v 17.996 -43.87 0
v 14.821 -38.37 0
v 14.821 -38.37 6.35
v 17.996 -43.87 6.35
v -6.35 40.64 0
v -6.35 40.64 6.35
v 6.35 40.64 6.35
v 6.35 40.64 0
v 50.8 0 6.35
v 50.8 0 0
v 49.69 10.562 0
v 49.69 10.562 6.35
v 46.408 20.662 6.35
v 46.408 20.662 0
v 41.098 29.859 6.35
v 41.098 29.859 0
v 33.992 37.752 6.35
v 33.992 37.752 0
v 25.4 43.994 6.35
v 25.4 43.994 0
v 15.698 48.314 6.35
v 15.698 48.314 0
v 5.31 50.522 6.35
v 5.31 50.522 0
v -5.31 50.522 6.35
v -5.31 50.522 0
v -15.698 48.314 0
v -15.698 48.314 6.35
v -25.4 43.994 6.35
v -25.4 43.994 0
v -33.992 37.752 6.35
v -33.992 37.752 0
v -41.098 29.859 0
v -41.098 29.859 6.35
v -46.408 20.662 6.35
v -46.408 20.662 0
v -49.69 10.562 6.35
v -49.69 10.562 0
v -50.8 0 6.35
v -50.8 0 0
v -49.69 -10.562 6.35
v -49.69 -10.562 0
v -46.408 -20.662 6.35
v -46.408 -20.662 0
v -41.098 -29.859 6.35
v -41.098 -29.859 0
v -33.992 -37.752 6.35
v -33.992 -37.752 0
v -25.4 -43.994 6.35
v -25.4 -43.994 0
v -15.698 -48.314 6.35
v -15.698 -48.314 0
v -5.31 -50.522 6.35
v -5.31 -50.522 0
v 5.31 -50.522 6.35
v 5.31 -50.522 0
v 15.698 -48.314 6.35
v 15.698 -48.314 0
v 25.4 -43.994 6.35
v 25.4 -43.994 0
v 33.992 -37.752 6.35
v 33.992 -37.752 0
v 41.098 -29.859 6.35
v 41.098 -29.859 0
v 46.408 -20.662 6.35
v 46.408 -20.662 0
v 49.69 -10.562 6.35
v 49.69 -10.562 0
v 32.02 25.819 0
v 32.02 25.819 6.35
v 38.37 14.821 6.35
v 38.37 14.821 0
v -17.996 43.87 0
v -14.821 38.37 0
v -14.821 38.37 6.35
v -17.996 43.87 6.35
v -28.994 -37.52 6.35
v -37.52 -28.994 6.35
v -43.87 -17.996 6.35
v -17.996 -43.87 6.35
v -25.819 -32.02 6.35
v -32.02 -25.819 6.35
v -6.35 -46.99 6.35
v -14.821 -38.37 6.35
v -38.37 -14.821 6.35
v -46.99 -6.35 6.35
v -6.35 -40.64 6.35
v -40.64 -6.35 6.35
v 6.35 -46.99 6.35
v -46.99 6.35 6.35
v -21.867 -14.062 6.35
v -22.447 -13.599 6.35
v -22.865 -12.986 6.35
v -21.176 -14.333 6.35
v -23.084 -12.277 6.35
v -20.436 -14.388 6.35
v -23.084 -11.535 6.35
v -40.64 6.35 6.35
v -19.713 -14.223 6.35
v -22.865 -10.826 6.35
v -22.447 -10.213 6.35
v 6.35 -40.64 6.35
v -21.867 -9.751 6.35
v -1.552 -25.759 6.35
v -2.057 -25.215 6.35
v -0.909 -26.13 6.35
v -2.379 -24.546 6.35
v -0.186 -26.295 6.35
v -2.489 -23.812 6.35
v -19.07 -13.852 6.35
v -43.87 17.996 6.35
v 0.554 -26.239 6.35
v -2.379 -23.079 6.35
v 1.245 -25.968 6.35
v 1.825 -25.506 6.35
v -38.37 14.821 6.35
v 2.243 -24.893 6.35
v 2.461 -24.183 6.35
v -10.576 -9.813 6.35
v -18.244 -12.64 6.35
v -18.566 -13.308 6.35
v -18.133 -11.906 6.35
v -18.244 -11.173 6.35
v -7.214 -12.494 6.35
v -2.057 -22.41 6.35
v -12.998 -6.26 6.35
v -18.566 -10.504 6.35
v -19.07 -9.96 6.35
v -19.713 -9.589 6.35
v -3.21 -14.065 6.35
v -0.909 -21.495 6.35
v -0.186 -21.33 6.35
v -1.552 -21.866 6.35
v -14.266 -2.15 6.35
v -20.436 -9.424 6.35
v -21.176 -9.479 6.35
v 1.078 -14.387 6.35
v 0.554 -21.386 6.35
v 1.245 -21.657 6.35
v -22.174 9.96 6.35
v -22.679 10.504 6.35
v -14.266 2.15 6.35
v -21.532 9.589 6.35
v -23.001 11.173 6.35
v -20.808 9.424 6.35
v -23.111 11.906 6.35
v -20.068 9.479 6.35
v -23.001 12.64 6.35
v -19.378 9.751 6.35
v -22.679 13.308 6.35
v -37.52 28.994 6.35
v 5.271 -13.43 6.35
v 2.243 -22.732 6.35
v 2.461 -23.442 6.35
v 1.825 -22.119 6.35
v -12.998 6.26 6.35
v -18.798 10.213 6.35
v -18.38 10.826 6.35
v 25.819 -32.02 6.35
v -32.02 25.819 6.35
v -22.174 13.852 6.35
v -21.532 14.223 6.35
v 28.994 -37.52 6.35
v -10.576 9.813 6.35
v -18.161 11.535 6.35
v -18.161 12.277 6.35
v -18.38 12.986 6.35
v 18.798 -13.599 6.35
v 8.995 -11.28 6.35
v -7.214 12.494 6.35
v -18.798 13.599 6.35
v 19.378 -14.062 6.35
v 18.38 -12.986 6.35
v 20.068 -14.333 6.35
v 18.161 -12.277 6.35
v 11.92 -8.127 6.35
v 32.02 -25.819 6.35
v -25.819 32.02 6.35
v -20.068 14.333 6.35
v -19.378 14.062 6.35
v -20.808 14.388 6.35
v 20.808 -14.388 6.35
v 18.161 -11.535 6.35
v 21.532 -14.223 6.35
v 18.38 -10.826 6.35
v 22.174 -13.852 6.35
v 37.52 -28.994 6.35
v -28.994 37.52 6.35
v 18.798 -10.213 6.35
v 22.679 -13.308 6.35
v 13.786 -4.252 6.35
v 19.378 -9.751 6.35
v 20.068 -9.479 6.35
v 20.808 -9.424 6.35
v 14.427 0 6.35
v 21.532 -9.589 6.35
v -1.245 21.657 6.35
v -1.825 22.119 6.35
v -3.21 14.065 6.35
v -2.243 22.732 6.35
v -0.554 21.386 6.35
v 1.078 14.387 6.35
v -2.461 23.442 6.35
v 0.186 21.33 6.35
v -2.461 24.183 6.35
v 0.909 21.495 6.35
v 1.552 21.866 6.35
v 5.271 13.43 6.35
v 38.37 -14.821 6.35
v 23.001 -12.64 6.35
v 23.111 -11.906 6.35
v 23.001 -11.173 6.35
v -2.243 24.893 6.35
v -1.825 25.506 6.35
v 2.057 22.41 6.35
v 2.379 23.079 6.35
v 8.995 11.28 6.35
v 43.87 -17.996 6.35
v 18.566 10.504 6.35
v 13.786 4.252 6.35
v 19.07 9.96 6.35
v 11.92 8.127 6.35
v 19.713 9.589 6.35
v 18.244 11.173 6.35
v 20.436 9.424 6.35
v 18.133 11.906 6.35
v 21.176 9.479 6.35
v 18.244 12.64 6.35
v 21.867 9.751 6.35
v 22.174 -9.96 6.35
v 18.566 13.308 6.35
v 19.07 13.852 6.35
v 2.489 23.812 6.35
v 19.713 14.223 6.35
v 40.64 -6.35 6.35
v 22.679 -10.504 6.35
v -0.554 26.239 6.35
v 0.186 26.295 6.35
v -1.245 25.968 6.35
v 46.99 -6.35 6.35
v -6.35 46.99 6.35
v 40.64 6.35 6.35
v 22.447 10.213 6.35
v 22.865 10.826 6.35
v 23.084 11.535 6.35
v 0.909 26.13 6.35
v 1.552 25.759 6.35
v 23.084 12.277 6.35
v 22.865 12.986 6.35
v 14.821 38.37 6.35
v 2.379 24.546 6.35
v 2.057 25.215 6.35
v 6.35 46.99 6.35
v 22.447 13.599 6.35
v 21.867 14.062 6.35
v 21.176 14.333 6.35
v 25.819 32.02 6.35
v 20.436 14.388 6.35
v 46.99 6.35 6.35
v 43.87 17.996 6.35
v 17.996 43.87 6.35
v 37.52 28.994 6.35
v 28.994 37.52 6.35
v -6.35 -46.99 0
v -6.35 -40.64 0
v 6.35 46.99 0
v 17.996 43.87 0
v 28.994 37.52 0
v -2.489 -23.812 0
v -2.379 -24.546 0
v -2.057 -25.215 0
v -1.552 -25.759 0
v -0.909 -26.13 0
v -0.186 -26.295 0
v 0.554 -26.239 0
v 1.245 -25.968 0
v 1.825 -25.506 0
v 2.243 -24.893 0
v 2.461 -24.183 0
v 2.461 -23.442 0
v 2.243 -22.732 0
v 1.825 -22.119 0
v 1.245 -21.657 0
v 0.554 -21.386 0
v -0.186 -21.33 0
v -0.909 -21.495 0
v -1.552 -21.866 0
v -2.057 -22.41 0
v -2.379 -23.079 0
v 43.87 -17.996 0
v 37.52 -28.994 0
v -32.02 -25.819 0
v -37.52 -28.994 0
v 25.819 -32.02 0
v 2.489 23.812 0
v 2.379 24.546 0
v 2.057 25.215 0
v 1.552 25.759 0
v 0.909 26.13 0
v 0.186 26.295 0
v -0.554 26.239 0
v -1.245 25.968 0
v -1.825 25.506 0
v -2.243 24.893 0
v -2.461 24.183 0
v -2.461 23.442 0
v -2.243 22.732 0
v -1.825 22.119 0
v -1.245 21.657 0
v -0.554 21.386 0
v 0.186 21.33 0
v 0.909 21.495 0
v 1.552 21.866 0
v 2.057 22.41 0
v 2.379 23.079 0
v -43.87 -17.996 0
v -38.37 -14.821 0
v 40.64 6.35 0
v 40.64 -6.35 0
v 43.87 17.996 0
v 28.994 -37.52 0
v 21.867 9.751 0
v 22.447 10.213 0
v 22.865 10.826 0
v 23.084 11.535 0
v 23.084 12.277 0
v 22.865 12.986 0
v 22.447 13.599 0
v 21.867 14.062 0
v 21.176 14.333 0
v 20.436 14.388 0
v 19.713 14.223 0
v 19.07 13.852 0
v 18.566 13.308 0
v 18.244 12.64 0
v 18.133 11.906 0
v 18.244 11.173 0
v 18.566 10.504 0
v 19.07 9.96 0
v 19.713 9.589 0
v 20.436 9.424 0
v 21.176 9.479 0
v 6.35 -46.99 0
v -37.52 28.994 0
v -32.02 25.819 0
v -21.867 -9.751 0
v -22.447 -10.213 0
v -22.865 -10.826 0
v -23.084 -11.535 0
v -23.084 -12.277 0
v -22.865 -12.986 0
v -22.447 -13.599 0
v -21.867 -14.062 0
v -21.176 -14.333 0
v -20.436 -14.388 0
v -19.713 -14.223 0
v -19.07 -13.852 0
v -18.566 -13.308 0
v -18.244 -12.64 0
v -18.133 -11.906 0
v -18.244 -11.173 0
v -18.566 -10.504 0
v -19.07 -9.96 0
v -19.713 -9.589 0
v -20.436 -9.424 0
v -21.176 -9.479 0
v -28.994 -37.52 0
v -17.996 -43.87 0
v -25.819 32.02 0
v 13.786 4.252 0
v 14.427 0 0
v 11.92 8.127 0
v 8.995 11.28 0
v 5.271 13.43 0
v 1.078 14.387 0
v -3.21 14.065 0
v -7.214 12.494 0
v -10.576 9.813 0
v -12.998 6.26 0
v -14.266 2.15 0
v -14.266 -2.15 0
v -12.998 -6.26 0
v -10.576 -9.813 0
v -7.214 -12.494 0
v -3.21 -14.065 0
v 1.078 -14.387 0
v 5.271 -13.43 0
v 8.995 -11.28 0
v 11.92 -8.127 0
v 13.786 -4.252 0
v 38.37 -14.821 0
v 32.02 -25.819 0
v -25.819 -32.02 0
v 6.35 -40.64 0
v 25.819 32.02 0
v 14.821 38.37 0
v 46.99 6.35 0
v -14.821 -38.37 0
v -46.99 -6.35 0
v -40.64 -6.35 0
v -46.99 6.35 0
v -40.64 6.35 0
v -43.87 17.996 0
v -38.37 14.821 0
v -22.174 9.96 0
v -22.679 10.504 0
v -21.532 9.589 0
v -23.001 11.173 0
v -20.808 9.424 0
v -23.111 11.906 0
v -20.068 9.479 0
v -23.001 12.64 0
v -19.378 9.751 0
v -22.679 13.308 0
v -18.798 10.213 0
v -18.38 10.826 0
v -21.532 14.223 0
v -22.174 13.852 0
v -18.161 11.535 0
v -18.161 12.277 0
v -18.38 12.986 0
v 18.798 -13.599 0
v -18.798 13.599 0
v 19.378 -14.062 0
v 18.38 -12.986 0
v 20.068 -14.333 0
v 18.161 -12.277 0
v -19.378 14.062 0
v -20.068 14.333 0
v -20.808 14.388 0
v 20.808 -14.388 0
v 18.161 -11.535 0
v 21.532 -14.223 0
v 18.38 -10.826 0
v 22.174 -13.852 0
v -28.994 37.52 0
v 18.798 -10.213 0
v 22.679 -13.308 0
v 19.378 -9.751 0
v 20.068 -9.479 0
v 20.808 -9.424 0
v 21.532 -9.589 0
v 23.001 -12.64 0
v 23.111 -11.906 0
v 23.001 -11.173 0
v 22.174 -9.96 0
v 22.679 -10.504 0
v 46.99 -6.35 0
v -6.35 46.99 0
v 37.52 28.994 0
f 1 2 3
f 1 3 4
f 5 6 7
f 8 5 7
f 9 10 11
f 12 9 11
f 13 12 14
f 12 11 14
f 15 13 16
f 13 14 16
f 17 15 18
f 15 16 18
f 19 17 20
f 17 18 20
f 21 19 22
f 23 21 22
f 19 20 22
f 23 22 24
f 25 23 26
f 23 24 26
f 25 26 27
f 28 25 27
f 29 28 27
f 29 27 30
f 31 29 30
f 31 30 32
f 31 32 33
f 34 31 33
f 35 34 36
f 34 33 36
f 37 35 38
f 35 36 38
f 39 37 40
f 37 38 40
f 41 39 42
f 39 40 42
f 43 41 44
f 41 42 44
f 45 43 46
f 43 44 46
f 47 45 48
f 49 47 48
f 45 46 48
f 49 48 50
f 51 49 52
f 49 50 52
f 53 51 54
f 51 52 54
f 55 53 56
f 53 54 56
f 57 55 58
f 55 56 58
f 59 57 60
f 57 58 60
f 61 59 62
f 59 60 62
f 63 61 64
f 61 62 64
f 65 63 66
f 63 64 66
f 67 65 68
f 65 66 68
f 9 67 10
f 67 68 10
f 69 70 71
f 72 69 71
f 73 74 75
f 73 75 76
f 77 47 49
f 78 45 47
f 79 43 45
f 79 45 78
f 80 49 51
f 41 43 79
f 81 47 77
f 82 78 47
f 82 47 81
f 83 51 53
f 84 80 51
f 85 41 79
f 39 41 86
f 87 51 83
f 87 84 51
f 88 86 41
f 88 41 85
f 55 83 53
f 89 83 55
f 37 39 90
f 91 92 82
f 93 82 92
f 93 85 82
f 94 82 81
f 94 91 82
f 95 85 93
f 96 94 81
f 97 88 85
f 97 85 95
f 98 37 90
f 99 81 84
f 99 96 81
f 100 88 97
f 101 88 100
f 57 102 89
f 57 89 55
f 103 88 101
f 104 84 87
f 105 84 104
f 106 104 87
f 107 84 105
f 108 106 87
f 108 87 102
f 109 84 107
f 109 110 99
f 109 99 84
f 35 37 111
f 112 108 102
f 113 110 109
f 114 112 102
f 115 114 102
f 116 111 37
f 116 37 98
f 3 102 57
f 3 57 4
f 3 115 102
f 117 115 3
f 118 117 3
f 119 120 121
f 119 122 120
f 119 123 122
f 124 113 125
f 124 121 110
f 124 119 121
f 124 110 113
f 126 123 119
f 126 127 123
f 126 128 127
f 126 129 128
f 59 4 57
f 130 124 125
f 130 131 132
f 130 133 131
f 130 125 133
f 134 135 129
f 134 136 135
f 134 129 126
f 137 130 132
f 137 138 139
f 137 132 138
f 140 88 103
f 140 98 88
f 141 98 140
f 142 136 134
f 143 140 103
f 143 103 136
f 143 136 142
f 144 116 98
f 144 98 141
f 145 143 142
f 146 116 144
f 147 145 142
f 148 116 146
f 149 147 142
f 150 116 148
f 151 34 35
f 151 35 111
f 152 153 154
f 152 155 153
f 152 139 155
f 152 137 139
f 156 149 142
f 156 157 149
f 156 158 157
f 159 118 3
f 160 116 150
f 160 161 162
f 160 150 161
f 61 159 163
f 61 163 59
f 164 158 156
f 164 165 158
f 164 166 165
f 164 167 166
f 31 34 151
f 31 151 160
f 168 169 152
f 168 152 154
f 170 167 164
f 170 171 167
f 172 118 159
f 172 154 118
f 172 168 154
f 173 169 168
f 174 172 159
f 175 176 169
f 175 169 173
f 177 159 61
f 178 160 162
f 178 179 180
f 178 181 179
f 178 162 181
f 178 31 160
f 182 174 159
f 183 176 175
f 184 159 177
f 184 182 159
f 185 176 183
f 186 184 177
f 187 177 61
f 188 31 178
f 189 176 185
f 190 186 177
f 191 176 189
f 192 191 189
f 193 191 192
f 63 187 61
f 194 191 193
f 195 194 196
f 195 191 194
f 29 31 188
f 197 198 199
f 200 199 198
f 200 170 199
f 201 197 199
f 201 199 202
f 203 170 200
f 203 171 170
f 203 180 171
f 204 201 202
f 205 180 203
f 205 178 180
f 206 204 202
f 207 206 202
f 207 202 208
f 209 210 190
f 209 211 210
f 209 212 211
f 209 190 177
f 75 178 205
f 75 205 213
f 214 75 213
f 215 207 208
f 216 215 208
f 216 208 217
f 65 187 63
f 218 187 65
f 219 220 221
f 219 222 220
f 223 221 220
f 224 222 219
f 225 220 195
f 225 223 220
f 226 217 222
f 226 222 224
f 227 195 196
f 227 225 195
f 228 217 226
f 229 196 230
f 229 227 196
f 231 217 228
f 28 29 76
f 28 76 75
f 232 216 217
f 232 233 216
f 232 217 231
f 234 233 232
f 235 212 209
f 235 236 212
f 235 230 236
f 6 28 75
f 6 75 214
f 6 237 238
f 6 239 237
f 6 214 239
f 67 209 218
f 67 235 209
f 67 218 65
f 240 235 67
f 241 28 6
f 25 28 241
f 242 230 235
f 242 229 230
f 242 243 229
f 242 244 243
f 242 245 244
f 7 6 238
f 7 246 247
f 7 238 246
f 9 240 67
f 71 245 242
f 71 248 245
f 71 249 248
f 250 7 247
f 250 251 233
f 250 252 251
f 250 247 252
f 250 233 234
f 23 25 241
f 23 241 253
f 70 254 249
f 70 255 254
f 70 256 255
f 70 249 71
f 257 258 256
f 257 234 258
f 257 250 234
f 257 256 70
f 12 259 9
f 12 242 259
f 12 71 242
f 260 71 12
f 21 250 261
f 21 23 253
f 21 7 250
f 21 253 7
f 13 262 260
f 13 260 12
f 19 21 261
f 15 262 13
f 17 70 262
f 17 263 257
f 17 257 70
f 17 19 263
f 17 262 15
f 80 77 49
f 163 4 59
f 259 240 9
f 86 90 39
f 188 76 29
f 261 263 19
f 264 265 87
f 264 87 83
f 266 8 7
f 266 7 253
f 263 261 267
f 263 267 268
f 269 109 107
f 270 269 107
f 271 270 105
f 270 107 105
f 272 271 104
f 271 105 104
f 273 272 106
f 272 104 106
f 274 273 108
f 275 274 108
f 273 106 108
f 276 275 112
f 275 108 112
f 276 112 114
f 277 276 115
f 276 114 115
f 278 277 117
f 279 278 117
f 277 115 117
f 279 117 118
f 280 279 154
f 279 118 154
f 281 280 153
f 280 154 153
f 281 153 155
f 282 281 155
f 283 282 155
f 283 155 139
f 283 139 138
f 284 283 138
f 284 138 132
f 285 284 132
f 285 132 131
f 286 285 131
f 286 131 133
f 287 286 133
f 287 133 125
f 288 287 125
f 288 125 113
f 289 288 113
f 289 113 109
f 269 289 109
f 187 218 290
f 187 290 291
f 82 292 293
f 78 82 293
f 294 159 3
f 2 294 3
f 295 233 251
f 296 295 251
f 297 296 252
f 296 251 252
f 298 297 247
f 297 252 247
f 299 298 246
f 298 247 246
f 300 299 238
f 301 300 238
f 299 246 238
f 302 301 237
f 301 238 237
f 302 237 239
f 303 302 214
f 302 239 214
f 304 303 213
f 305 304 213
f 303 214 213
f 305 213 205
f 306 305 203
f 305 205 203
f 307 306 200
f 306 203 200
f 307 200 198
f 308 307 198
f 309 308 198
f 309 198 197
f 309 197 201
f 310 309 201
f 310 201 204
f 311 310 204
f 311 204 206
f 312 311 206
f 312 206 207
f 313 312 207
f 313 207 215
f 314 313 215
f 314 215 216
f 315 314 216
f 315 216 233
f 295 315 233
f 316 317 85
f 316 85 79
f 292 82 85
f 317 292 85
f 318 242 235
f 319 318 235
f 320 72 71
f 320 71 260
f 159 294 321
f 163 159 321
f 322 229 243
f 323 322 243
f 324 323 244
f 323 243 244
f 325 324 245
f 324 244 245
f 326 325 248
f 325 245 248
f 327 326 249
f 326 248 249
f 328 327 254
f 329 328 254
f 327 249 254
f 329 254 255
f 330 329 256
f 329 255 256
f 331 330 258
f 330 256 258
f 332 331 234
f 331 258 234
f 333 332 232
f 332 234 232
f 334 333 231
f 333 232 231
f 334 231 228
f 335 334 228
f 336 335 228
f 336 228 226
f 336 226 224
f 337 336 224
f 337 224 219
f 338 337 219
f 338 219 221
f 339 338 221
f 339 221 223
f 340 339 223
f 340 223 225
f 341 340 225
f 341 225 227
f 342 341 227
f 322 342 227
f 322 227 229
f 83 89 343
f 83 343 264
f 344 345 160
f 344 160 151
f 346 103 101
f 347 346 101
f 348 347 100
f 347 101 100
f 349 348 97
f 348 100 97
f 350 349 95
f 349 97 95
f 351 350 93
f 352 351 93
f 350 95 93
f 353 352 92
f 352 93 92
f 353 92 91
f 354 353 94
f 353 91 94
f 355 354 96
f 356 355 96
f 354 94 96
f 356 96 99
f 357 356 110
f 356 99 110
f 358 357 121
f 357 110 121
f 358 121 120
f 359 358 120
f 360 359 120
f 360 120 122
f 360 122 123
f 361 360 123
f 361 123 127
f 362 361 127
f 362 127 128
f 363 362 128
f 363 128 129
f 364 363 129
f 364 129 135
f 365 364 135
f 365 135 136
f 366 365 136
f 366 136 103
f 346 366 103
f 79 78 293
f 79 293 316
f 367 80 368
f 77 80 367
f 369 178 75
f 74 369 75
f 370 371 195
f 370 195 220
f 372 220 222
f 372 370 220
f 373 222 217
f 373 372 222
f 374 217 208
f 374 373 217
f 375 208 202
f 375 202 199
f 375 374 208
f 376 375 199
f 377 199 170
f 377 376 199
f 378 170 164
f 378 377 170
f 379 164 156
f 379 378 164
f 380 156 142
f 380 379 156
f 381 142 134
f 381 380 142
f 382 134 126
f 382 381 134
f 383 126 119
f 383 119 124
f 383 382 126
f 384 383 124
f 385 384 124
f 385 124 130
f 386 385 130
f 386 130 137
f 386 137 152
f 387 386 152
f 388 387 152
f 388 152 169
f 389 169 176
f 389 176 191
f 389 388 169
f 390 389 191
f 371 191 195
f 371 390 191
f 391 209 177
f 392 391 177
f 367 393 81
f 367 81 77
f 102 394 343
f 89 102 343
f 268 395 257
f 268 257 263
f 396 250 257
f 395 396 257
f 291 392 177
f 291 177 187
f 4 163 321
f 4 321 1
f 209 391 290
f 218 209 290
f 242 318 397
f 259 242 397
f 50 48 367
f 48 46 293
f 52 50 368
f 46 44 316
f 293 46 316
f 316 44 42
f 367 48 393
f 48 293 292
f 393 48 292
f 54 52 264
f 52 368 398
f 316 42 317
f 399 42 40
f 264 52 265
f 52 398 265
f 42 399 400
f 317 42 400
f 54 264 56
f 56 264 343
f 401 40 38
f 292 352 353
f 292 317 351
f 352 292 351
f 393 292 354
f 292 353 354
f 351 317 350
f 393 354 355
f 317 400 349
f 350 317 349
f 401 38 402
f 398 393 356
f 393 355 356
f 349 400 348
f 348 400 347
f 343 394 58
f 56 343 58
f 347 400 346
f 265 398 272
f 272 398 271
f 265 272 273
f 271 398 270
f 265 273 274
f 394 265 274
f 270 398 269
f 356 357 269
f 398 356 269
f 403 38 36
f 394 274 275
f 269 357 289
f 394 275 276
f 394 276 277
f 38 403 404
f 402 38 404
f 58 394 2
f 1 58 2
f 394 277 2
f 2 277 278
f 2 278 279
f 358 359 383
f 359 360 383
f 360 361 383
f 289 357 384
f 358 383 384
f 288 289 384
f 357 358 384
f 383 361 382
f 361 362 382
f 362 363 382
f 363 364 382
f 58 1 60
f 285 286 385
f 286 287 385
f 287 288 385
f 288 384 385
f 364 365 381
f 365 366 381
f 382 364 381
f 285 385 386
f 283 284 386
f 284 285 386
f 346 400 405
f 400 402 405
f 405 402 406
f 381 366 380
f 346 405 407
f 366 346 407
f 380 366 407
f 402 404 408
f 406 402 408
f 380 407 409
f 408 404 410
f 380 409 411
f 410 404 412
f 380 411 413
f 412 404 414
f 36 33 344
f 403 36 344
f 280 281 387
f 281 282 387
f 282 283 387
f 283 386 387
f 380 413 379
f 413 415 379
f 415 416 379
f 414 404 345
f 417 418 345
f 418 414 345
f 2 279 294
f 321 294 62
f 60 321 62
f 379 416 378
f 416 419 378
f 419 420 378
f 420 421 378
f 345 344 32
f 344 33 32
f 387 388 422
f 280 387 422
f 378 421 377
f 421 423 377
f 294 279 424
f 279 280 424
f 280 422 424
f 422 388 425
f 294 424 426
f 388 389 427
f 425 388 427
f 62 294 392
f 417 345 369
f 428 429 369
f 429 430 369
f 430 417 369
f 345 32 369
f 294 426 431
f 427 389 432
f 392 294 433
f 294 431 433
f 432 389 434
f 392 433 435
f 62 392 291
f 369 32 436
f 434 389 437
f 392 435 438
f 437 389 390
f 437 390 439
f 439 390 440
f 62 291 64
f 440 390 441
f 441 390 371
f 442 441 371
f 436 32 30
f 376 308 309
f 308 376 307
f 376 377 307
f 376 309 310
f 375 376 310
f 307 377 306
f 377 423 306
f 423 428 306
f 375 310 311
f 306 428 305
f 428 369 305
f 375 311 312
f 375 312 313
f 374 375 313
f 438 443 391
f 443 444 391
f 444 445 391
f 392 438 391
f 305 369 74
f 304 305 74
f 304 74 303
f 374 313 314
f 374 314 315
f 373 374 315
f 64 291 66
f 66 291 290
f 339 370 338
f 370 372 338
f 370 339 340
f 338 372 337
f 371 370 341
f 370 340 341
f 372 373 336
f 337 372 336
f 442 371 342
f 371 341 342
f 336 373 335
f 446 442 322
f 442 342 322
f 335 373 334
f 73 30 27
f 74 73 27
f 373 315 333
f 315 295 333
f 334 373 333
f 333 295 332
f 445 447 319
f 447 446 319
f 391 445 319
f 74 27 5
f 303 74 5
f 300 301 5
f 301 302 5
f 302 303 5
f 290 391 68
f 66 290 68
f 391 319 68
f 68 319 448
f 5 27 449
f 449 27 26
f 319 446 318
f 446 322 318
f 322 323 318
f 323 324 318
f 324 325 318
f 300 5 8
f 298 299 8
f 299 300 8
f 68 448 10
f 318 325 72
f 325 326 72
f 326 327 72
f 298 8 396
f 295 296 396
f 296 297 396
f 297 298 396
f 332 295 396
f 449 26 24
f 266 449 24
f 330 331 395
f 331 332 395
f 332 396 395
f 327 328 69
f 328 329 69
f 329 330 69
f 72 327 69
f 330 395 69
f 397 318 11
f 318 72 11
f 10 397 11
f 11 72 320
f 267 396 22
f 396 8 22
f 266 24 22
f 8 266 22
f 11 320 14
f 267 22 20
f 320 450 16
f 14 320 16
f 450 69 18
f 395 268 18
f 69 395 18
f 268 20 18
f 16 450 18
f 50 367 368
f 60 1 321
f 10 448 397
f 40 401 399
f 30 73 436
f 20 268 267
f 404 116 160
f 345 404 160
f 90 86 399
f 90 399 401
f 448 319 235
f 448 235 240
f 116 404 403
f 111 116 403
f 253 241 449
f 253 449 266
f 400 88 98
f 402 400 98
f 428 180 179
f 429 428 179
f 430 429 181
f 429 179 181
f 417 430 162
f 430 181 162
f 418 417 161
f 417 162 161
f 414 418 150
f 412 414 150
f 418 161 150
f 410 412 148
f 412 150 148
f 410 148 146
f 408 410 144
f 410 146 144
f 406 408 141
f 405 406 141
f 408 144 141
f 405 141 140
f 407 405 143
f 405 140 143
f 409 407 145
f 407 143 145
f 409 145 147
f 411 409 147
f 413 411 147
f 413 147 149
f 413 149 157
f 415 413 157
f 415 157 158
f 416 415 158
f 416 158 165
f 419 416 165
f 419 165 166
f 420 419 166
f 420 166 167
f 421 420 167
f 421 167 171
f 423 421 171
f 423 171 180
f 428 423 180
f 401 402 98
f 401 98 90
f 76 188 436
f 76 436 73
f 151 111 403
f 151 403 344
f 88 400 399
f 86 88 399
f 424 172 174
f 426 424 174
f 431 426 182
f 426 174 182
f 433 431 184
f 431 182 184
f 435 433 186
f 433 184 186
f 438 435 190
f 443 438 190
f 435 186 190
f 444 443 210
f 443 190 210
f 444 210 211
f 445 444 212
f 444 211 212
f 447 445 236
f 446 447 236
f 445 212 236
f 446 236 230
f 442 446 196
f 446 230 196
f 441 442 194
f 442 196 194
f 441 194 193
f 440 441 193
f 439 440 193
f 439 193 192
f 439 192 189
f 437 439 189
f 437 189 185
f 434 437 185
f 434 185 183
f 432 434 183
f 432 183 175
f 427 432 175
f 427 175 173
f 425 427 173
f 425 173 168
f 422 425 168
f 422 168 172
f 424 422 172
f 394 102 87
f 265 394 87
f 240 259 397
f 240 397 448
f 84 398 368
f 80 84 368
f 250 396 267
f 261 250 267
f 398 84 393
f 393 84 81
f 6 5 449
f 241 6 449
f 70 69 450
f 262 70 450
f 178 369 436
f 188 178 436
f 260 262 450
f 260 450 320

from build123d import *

# Parameters (mm, degrees)
F0_R            = 50.8
F0_R_2          = 14.4272
F1_DEPTH        = 6.35
F2_W            = 12.7
F2_H            = 6.35
F3_DEPTH        = 6.351
F3_COPIES_COUNT = 12
F4_R            = 2.4892
F5_DEPTH        = 6.351
F5_COPIES_COUNT = 6


# Not quite as in the source:
# - a pattern or mirror of a feature is missing from the dataset's text; its kind, count and spacing are read off the source's solid


with BuildPart() as f1:
    # F0 (on Top) → F1 (new body)
    with BuildSketch(Plane.XY):
        Circle(F0_R)
        Circle(F0_R_2, mode=Mode.SUBTRACT)
    extrude(amount=F1_DEPTH)

    # F2 (on face) → F3 (cut, through all)
    with BuildSketch(Plane.XY.offset(6.35)):
        with Locations((0, 43.815)):
            Rectangle(F2_W, F2_H)
    f3 = extrude(amount=-F3_DEPTH, mode=Mode.SUBTRACT)

    # F3_copies: F3 ×12 about axis
    f3_copies_axis = Axis((0, 0, 0), (0, 0, 1))
    for i in range(1, F3_COPIES_COUNT):
        add(f3.rotate(f3_copies_axis, i * 360 / F3_COPIES_COUNT), mode=Mode.SUBTRACT)

    # F4 (on face) → F5 (cut, through all)
    with BuildSketch(Plane.XY.offset(6.35)):
        with Locations((0, 23.8125)):
            Circle(F4_R)
    f5 = extrude(amount=-F5_DEPTH, mode=Mode.SUBTRACT)

    # F5_copies: F5 ×6 about axis
    f5_copies_axis = Axis((0, 0, 0), (0, 0, 1))
    for i in range(1, F5_COPIES_COUNT):
        add(f5.rotate(f5_copies_axis, i * 360 / F5_COPIES_COUNT), mode=Mode.SUBTRACT)


solid = f1.part
